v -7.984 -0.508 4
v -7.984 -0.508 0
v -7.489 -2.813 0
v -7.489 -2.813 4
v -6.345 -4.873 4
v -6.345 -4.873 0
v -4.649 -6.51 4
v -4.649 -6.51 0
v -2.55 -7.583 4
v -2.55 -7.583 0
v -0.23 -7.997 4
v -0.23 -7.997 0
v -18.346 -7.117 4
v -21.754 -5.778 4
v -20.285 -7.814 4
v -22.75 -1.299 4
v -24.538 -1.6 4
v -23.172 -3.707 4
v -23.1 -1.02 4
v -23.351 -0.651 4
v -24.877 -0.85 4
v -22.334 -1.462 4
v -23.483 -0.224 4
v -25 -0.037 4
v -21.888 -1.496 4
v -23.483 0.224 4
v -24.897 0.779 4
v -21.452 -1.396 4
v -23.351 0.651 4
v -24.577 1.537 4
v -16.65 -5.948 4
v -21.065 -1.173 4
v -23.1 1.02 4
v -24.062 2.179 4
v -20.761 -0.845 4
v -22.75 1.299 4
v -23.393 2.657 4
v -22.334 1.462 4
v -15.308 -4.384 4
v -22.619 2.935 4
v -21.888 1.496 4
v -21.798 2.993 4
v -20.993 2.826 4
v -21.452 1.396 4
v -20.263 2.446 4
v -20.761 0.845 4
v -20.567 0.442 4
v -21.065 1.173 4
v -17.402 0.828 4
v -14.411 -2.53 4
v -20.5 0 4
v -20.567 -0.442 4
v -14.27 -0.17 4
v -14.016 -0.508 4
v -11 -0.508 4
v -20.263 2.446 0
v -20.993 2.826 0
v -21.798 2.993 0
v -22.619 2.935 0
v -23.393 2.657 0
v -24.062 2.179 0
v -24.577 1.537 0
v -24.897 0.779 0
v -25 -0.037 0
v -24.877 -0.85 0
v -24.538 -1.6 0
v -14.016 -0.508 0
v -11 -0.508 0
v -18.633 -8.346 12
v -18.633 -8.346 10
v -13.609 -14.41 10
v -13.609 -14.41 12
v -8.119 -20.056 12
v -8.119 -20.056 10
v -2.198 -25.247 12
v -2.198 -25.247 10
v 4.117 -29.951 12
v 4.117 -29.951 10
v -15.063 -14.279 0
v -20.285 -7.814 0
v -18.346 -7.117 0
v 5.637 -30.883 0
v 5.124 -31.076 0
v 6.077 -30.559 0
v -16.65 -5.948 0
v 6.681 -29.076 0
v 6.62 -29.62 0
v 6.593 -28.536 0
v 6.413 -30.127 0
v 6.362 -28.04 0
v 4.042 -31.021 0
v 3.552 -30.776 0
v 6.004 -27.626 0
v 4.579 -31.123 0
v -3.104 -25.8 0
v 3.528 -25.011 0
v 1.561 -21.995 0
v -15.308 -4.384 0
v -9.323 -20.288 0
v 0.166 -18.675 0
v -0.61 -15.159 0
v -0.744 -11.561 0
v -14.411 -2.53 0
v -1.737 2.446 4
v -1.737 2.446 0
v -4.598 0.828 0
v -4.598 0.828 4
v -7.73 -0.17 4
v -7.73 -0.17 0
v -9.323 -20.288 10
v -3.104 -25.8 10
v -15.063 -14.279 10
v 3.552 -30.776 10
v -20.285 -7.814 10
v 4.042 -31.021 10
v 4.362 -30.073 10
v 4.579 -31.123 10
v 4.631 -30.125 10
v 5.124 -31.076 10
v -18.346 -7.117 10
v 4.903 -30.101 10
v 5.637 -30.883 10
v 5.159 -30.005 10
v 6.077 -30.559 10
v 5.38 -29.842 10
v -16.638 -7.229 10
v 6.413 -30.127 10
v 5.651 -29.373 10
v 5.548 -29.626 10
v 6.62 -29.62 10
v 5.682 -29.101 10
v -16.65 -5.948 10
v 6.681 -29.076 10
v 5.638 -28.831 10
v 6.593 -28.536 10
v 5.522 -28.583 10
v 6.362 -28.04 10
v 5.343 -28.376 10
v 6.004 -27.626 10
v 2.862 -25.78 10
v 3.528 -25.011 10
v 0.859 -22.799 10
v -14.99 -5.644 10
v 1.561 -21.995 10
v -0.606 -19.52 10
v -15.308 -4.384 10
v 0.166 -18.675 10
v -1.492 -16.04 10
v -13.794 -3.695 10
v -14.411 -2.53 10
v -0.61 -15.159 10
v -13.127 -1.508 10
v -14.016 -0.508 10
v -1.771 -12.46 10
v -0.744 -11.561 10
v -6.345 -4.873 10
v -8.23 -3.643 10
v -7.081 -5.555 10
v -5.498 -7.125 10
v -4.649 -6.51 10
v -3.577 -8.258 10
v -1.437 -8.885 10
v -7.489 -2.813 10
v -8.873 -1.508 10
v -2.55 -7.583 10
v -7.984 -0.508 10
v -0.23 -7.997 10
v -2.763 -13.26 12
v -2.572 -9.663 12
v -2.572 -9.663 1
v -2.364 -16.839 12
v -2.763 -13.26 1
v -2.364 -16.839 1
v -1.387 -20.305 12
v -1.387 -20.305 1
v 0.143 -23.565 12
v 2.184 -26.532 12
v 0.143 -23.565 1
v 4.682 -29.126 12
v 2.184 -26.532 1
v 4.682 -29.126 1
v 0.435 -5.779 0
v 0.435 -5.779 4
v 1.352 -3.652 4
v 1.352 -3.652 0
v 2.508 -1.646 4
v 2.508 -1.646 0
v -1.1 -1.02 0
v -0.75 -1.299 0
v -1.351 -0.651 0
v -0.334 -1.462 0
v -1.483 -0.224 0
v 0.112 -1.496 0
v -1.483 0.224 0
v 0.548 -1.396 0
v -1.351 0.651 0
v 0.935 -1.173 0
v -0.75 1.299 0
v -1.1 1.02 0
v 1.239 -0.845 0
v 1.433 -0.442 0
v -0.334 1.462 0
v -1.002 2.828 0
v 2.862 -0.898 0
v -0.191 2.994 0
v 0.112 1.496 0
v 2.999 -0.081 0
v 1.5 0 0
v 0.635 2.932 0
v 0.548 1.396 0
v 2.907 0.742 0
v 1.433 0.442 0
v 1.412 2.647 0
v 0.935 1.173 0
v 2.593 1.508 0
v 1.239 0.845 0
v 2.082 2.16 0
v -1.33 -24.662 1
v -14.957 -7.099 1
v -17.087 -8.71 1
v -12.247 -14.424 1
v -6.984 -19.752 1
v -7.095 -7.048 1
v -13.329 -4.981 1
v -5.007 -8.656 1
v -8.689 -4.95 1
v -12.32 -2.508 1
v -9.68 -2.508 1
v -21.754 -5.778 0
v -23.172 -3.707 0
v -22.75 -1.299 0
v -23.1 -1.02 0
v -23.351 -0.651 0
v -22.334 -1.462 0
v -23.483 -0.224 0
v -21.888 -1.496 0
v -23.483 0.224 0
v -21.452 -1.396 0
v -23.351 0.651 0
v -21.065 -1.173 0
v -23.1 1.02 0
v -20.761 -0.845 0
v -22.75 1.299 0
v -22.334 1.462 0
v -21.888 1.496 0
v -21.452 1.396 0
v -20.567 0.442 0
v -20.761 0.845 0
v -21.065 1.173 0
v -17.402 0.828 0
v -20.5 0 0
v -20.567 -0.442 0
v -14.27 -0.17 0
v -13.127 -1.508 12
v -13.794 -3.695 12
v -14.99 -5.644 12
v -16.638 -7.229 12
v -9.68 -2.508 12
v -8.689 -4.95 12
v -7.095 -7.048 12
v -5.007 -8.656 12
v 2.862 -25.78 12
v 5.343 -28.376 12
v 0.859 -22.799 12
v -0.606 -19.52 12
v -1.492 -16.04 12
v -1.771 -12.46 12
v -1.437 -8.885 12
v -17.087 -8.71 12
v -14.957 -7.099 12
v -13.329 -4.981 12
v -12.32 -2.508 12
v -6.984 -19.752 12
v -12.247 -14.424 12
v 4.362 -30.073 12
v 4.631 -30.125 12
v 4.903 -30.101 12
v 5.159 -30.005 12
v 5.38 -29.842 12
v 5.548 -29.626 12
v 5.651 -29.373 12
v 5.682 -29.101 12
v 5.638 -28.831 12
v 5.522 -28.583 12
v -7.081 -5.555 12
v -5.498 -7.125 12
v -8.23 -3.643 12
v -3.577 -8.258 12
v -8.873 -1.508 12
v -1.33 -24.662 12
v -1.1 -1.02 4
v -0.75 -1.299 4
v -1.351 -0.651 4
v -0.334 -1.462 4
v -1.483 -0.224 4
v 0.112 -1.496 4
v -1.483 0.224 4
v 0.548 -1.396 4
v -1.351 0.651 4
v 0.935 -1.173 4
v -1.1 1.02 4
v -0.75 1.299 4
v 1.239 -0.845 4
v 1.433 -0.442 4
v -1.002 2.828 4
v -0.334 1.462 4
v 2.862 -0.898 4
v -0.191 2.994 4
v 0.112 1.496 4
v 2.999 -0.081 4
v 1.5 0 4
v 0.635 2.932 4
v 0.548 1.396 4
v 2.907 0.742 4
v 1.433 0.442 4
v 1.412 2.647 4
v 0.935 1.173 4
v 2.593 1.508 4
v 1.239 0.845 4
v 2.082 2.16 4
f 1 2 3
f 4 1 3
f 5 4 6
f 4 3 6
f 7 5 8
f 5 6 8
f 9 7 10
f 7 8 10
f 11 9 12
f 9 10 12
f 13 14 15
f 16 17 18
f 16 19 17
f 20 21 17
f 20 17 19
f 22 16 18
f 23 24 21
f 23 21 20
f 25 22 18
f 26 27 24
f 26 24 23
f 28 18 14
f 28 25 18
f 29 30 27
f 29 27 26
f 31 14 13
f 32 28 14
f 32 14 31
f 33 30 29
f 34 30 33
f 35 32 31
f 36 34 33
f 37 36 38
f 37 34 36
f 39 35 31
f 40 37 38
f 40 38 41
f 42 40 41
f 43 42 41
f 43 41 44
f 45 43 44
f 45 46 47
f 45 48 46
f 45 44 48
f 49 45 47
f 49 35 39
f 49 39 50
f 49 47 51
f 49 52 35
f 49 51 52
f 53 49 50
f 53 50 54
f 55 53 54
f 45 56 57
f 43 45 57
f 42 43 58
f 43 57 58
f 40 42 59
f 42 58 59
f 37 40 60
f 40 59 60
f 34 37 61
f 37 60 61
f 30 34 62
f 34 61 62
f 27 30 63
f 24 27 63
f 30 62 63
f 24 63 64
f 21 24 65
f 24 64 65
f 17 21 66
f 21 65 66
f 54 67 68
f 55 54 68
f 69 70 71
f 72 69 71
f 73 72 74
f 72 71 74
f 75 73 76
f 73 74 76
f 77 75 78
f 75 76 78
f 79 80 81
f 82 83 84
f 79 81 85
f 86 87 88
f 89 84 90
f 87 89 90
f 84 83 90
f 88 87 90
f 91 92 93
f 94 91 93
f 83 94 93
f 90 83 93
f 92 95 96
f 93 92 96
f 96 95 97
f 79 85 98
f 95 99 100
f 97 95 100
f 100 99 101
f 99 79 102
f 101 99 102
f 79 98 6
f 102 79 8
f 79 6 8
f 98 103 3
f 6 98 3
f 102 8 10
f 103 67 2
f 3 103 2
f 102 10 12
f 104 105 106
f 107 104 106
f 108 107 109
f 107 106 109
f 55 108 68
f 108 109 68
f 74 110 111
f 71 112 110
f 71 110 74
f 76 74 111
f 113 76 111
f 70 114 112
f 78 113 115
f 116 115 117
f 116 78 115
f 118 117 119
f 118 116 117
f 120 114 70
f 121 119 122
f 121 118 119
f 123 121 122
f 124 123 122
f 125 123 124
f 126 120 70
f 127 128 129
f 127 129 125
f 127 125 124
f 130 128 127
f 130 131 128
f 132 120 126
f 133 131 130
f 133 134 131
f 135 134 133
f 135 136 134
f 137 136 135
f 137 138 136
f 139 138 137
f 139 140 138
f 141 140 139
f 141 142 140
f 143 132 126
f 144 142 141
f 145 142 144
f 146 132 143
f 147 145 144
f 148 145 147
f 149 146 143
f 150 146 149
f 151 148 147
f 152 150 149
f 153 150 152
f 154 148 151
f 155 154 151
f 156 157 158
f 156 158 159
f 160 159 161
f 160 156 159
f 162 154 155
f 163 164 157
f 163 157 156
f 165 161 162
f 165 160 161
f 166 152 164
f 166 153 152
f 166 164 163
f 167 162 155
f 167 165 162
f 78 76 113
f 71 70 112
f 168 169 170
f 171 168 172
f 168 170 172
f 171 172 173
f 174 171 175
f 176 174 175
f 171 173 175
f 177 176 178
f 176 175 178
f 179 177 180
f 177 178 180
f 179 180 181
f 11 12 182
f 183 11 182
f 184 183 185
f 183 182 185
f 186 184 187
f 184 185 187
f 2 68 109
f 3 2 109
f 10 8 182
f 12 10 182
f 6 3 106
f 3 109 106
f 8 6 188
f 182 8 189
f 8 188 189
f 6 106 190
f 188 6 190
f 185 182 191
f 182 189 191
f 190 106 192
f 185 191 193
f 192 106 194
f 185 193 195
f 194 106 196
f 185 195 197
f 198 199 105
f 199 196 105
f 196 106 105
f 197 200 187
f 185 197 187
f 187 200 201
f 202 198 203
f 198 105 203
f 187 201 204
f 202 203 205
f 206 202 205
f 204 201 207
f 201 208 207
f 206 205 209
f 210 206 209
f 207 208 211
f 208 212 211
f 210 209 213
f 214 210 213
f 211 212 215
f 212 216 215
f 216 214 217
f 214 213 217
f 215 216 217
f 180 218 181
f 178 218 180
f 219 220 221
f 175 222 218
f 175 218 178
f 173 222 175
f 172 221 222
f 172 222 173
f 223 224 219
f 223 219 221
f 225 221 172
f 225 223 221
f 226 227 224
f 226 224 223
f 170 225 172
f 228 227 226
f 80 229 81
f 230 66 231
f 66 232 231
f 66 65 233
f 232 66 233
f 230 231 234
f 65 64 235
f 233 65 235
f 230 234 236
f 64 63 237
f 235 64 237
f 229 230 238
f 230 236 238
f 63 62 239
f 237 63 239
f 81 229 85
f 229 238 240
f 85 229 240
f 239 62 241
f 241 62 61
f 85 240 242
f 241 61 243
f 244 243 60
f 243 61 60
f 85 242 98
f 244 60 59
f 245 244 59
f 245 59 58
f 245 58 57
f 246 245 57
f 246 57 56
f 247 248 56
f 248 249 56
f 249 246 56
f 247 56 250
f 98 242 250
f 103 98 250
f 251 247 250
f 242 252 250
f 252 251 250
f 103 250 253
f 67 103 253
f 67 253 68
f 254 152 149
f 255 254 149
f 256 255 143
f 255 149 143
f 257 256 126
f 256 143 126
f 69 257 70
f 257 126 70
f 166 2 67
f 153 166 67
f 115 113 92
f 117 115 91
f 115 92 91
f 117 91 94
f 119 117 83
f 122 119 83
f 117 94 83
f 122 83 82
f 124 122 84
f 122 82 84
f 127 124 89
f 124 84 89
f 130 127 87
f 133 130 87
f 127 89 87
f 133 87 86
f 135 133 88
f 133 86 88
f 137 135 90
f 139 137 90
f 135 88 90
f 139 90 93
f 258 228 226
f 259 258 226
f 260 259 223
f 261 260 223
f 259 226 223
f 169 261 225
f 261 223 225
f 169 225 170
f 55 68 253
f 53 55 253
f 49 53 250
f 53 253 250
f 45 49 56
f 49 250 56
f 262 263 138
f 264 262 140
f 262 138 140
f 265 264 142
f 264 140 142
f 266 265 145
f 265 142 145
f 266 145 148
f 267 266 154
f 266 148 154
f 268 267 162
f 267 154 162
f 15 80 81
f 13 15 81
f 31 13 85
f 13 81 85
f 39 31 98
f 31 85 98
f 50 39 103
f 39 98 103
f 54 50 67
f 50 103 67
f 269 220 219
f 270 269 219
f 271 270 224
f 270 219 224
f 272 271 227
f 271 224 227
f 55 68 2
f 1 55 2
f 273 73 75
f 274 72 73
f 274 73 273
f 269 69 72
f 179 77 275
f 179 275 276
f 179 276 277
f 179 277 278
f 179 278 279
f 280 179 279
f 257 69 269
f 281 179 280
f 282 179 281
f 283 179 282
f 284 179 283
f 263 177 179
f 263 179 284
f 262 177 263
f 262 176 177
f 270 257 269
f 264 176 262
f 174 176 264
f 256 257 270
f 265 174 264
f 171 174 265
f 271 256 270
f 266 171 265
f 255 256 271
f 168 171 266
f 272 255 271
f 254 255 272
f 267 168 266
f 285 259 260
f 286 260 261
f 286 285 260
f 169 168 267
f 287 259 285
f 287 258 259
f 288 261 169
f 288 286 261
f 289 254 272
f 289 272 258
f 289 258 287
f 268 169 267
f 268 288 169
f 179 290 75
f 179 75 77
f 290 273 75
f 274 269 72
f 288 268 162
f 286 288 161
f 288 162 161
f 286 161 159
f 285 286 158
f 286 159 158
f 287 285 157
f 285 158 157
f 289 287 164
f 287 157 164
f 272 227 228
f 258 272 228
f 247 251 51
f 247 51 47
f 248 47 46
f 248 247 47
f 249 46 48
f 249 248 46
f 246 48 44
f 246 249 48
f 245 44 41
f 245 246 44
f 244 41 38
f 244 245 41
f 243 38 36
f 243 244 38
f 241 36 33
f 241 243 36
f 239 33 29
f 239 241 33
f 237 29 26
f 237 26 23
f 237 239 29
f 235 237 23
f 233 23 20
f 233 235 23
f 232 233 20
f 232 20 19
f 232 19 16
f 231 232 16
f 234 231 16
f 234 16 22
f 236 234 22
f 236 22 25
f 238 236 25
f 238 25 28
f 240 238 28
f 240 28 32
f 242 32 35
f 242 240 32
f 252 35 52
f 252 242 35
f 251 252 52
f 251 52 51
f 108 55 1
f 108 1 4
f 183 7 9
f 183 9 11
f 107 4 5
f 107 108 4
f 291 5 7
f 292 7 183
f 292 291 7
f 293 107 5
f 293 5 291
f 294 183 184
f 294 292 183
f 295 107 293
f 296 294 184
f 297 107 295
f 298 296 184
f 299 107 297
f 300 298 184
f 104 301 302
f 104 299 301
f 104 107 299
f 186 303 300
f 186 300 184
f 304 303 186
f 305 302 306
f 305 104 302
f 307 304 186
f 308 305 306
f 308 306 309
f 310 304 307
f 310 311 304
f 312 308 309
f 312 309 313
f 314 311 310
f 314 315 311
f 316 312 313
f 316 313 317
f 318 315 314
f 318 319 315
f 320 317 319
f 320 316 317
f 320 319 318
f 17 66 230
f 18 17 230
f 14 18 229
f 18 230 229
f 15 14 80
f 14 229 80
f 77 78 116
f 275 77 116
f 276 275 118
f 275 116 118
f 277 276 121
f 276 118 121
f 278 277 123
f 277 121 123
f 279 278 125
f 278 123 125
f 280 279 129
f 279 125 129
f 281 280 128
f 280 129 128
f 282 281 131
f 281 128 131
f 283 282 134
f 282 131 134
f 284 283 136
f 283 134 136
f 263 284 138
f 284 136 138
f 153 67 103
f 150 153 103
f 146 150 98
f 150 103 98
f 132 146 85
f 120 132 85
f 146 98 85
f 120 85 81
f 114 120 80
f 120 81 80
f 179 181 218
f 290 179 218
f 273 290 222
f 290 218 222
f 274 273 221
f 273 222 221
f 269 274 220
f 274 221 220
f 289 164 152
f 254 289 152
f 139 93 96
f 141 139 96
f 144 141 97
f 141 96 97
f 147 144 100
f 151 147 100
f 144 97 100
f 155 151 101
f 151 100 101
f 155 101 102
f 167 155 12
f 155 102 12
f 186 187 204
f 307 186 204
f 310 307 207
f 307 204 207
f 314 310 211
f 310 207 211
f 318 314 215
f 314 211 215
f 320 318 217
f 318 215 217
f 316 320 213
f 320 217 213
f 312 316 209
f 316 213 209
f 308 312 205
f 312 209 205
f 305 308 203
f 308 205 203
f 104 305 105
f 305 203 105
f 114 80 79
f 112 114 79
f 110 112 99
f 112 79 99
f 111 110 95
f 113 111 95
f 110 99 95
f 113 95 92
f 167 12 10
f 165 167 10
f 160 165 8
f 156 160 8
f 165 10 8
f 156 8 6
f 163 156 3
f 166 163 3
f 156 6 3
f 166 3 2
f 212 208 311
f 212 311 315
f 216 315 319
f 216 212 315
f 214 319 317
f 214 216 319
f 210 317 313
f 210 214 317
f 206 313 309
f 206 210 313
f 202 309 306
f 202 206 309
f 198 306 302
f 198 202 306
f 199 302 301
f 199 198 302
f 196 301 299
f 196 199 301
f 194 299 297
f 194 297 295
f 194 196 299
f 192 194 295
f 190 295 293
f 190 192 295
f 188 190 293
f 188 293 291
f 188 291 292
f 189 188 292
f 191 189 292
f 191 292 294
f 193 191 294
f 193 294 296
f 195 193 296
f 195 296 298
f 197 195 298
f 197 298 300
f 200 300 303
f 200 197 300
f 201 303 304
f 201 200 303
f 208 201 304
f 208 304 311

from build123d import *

# Parameters (mm, degrees)
F0_R     = 1.5
F1_DEPTH = 4
F2_DEPTH = 10
F3_DEPTH = 12
F4_DEPTH = 1


with BuildPart() as f1:
    # F0 (on Top) → F1 (new body)
    with BuildSketch(Plane.XY):
        with BuildLine():
            ThreePointArc((-11, -0.508067), (-15.861408, 0.248354), (-20.263158, 2.446095))
            ThreePointArc((-20.263158, 2.446095), (-24.062275, 2.178767), (-24.537749, -1.599947))
            ThreePointArc((-24.537749, -1.599947), (-22.469836, -4.747013), (-20.284903, -7.81399))
            ThreePointArc((-20.284903, -7.81399), (-15.928631, -5.20946), (-14.01615, -0.508067))
            Line((-14.01615, -0.508067), (-11, -0.508067))
        make_face()
        with Locations((-22, 0)):
            Circle(F0_R, mode=Mode.SUBTRACT)
        with BuildLine():
            ThreePointArc((-1.736842, 2.446095), (-6.138592, 0.248354), (-11, -0.508067))
            Line((-11, -0.508067), (-7.98385, -0.508067))
            ThreePointArc((-7.98385, -0.508067), (-5.557644, -5.754354), (-0.230172, -7.996688))
            ThreePointArc((-0.230172, -7.996688), (0.862339, -4.7022), (2.507986, -1.64621))
            ThreePointArc((2.507986, -1.64621), (2.082163, 2.159767), (-1.736842, 2.446095))
        make_face()
        Circle(F0_R, mode=Mode.SUBTRACT)
    extrude(amount=F1_DEPTH)


with BuildPart() as f2:
    # F0 (on Top) → F2 (new body)
    with BuildSketch(Plane.XY):
        with BuildLine():
            Line((-7.98385, -0.508067), (-11, -0.508067))
            Line((-11, -0.508067), (-14.01615, -0.508067))
            ThreePointArc((-14.01615, -0.508067), (-15.928631, -5.20946), (-20.284903, -7.81399))
            ThreePointArc((-20.284903, -7.81399), (-9.323059, -20.2881), (3.551962, -30.776156))
            ThreePointArc((3.551962, -30.776156), (6.26024, -30.354478), (6.004354, -27.62554))
            ThreePointArc((6.004354, -27.62554), (0.166288, -18.675297), (-0.230172, -7.996688))
            ThreePointArc((-0.230172, -7.996688), (-5.557644, -5.754354), (-7.98385, -0.508067))
        make_face()
        with BuildLine():
            ThreePointArc((-18.632998, -8.346454), (-14.989737, -5.644131), (-13.127248, -1.508067))
            Line((-13.127248, -1.508067), (-8.872752, -1.508067))
            ThreePointArc((-8.872752, -1.508067), (-6.338454, -6.389367), (-1.437035, -8.884533))
            ThreePointArc((-1.437035, -8.884533), (-0.606334, -19.520465), (5.343177, -28.37577))
            ThreePointArc((5.343177, -28.37577), (5.47112, -29.740239), (4.116981, -29.951078))
            ThreePointArc((4.116981, -29.951078), (-8.119284, -20.055701), (-18.632998, -8.346454))
        make_face(mode=Mode.SUBTRACT)
    extrude(amount=F2_DEPTH)

    # F0 (on Top) → F3 (join)
    with BuildSketch(Plane.XY):
        with BuildLine():
            Line((-8.872752, -1.508067), (-13.127248, -1.508067))
            ThreePointArc((-13.127248, -1.508067), (-14.989737, -5.644131), (-18.632998, -8.346454))
            ThreePointArc((-18.632998, -8.346454), (-8.119284, -20.055701), (4.116981, -29.951078))
            ThreePointArc((4.116981, -29.951078), (5.47112, -29.740239), (5.343177, -28.37577))
            ThreePointArc((5.343177, -28.37577), (-0.606334, -19.520465), (-1.437035, -8.884533))
            ThreePointArc((-1.437035, -8.884533), (-6.338454, -6.389367), (-8.872752, -1.508067))
        make_face()
        with BuildLine():
            Line((-12.319628, -2.508067), (-9.680372, -2.508067))
            ThreePointArc((-9.680372, -2.508067), (-7.09455, -7.047507), (-2.572414, -9.663472))
            ThreePointArc((-2.572414, -9.663472), (-1.386642, -20.30475), (4.682, -29.126))
            ThreePointArc((4.682, -29.126), (-6.984475, -19.751655), (-17.087479, -8.710174))
            ThreePointArc((-17.087479, -8.710174), (-14.071906, -6.094697), (-12.319628, -2.508067))
        make_face(mode=Mode.SUBTRACT)
    extrude(amount=F3_DEPTH)

    # F0 (on Top) → F4 (join)
    with BuildSketch(Plane.XY):
        with BuildLine():
            ThreePointArc((-2.572414, -9.663472), (-7.09455, -7.047507), (-9.680372, -2.508067))
            Line((-9.680372, -2.508067), (-12.319628, -2.508067))
            ThreePointArc((-12.319628, -2.508067), (-14.071906, -6.094697), (-17.087479, -8.710174))
            ThreePointArc((-17.087479, -8.710174), (-6.984475, -19.751655), (4.682, -29.126))
            ThreePointArc((4.682, -29.126), (-1.386642, -20.30475), (-2.572414, -9.663472))
        make_face()
    extrude(amount=F4_DEPTH)


solid = Compound([f1.part, f2.part])
